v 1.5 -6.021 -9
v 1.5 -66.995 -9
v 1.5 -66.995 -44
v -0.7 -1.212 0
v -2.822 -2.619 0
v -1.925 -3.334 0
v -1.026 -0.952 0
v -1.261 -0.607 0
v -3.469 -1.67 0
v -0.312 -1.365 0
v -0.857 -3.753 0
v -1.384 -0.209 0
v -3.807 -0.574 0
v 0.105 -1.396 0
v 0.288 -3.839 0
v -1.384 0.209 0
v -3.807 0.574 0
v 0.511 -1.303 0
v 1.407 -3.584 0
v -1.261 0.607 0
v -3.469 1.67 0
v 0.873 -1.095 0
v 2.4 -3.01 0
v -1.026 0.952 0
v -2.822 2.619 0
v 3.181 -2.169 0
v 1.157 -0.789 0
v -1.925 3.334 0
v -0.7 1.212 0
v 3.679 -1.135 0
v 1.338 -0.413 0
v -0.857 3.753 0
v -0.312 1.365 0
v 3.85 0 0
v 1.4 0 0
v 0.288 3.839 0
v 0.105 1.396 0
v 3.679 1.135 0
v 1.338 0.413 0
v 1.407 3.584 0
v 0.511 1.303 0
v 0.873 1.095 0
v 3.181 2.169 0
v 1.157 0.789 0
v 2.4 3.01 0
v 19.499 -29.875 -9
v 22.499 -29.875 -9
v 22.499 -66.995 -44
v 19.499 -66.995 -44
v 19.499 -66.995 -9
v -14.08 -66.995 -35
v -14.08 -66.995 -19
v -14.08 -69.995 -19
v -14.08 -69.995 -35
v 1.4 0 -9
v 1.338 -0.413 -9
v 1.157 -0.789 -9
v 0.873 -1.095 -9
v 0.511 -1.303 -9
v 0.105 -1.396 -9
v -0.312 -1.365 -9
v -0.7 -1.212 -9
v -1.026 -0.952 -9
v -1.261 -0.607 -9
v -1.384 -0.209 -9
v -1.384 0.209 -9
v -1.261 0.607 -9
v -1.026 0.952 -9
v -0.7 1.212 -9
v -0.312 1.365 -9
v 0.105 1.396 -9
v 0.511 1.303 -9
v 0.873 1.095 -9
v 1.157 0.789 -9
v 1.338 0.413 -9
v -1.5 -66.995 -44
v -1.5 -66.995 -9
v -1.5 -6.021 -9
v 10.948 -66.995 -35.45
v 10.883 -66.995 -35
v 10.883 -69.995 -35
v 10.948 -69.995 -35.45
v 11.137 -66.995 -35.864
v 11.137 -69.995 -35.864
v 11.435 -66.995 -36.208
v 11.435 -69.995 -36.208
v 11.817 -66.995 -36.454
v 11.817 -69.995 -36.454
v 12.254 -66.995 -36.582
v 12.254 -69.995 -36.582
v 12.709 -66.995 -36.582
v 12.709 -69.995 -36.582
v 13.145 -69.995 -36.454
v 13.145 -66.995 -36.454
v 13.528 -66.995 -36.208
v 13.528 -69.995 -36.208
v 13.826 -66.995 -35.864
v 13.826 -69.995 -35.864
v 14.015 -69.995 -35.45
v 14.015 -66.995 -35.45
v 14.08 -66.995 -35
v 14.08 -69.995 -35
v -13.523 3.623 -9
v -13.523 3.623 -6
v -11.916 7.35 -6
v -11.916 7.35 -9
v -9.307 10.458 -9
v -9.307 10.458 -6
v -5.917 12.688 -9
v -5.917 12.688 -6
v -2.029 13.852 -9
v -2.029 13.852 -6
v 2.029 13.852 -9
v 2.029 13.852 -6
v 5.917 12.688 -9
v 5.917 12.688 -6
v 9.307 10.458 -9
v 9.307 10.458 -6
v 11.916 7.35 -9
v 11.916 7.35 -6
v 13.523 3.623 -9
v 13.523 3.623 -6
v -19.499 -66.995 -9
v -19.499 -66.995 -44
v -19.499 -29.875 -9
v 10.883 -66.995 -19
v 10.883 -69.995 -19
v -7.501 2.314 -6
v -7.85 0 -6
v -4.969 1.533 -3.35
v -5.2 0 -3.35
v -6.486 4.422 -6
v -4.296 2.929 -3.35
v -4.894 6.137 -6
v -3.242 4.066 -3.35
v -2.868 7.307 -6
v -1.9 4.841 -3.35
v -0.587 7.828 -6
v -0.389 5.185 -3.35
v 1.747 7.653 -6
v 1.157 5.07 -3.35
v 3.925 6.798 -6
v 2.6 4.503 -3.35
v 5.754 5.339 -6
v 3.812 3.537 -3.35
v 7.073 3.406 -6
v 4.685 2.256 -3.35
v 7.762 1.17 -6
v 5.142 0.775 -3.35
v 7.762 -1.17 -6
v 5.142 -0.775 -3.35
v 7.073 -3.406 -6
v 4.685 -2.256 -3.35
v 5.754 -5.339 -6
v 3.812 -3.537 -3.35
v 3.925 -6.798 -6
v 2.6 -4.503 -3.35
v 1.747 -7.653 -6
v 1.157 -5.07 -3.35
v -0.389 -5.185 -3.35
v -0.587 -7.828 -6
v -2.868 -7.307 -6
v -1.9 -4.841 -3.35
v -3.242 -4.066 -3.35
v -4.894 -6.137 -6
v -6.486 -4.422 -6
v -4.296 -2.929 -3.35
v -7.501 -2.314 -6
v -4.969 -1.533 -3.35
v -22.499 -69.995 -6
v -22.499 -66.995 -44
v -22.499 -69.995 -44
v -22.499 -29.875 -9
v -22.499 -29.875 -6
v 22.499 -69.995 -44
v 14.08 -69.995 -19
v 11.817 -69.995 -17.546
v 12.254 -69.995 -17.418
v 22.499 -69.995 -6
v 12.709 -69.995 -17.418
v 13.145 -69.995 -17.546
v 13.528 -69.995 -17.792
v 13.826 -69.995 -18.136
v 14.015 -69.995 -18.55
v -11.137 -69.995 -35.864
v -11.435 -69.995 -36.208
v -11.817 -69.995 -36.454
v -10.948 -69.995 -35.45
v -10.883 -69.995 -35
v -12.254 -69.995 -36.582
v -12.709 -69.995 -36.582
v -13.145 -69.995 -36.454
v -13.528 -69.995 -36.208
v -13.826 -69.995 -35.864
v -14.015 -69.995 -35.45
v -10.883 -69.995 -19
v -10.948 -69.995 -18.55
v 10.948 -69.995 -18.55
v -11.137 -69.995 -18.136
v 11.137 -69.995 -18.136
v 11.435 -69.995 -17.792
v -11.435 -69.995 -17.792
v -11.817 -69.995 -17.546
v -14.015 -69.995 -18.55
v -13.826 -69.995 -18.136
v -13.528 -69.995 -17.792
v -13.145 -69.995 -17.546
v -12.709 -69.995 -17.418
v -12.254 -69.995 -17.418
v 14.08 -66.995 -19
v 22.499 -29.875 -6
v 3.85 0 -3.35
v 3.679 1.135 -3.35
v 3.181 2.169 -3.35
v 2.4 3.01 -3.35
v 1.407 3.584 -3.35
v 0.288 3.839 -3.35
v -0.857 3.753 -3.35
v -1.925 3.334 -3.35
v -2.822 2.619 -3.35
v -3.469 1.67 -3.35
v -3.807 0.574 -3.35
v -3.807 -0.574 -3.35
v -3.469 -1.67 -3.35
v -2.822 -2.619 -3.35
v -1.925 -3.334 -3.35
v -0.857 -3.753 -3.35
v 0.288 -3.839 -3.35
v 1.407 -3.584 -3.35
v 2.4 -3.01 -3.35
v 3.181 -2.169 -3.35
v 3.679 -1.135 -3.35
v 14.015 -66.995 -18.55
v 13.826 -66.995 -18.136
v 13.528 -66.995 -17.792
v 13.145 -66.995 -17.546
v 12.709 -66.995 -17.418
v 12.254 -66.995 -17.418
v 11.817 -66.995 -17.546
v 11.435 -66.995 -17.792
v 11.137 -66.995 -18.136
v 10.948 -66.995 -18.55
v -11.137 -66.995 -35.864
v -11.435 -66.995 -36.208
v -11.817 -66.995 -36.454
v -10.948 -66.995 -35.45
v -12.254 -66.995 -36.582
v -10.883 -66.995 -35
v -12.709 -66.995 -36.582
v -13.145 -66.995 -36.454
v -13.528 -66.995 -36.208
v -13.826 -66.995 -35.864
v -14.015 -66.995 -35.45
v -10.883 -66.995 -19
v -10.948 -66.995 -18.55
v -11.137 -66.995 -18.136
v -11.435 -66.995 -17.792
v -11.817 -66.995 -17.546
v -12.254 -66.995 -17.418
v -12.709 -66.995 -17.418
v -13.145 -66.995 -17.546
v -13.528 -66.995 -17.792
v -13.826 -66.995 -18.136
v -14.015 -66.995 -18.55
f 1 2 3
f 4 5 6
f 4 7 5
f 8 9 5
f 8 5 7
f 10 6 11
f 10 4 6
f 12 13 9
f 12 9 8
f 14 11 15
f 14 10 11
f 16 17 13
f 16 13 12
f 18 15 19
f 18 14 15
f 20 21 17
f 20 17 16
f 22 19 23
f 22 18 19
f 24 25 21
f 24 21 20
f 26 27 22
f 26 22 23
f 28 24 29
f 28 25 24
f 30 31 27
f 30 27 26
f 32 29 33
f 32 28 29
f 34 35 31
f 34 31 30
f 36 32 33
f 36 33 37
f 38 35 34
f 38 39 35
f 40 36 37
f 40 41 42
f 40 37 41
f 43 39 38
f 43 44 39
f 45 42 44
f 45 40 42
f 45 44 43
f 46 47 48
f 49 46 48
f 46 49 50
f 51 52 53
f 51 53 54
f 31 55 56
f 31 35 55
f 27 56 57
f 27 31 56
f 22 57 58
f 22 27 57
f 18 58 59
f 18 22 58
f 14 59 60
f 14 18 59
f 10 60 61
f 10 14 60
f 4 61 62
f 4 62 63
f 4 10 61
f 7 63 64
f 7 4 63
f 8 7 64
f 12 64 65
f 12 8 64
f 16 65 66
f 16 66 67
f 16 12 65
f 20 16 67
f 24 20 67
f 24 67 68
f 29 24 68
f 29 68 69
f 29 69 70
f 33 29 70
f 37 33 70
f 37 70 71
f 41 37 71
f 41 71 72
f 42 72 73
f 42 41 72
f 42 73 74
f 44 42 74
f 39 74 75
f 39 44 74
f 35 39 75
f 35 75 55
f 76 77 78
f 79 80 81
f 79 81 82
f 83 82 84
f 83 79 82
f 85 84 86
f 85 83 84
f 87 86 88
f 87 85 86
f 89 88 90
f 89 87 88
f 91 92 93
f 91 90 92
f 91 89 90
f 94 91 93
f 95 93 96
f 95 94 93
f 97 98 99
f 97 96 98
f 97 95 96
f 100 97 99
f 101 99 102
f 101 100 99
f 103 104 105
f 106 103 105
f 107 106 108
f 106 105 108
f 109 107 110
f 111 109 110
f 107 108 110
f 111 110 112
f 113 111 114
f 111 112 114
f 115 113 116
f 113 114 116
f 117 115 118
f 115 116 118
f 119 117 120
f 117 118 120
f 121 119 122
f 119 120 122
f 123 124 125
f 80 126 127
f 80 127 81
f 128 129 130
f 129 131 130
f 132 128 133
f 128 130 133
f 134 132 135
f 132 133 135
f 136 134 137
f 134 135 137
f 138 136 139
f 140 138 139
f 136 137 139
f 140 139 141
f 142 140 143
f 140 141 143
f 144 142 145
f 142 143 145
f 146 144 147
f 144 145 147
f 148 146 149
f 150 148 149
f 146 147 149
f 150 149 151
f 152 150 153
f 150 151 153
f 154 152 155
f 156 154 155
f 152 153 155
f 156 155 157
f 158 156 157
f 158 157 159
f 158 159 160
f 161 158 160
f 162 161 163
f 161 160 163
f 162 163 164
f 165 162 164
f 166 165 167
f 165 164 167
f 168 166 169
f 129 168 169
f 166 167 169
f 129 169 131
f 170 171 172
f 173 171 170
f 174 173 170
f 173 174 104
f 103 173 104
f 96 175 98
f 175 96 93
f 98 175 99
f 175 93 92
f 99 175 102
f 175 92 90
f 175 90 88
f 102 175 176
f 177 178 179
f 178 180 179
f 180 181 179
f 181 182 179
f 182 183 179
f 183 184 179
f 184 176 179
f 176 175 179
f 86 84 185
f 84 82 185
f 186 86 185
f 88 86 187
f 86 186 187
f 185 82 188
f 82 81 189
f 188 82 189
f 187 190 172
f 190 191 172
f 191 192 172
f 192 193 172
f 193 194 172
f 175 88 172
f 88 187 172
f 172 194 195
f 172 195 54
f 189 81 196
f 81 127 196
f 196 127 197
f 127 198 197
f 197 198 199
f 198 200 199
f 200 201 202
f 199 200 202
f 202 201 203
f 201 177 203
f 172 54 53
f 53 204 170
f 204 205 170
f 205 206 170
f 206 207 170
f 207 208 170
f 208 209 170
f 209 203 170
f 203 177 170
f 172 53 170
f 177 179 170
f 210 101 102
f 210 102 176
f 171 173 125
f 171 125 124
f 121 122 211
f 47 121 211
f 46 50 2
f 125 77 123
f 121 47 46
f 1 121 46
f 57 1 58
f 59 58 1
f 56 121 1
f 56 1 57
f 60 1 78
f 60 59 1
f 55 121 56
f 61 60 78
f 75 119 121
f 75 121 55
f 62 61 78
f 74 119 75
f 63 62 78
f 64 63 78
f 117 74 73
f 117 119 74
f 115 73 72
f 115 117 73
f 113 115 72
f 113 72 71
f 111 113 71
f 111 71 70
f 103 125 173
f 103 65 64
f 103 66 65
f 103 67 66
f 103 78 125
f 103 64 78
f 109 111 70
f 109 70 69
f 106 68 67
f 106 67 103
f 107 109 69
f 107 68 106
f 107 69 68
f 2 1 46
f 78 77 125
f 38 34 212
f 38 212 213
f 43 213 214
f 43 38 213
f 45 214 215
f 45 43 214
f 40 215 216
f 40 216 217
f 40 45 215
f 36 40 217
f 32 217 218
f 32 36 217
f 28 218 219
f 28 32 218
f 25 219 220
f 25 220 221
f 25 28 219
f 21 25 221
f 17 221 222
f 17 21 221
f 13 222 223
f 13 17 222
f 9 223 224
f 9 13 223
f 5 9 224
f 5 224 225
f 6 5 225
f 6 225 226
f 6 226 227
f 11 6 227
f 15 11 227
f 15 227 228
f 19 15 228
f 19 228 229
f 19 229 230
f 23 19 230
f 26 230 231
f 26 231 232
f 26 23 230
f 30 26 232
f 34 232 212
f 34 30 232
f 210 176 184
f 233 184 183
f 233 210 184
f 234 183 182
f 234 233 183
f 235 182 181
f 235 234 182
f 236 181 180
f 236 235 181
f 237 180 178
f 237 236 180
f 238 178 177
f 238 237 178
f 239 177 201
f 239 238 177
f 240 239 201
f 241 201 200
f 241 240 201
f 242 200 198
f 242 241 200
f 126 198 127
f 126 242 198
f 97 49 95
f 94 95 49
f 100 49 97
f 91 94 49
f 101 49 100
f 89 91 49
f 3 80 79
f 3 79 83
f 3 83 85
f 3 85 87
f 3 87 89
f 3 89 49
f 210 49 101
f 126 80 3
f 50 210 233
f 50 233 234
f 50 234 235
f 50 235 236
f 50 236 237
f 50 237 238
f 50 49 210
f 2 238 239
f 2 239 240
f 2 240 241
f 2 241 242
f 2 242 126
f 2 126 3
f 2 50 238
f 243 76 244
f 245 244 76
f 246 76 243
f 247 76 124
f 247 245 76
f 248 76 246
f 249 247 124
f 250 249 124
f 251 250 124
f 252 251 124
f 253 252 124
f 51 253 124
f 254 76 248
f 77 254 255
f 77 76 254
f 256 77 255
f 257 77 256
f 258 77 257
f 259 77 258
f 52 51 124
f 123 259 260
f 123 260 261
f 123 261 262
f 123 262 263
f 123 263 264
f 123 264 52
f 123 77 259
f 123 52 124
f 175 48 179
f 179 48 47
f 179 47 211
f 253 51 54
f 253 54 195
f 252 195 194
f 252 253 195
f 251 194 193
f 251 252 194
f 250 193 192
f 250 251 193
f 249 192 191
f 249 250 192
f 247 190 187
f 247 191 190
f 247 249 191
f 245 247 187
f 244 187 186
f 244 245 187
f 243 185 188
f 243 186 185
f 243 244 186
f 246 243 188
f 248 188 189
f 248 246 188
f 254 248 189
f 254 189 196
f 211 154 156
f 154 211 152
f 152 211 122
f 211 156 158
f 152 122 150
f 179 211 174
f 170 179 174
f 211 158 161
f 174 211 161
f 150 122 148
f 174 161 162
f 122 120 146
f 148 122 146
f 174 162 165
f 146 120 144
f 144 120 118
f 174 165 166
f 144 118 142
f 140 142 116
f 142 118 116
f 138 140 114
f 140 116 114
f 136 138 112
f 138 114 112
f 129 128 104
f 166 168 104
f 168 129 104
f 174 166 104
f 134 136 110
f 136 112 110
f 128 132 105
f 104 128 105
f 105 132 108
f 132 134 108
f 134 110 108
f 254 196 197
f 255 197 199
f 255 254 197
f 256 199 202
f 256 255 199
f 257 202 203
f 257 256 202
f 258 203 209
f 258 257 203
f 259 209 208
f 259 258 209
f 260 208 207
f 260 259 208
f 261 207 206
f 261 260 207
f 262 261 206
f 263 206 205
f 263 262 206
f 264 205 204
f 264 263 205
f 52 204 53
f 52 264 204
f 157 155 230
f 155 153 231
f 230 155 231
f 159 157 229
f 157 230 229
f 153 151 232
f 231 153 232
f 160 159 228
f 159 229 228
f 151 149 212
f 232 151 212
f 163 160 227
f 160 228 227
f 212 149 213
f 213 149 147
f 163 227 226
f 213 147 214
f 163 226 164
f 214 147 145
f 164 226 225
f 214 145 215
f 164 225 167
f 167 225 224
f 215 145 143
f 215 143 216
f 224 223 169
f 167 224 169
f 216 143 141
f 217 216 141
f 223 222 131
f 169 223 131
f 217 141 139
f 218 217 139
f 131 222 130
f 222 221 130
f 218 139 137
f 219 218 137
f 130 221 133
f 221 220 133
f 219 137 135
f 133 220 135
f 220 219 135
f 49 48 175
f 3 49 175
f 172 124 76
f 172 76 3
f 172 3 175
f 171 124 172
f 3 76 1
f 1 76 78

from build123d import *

# Parameters (mm, degrees)
SKETCH_1_R           = 3.85
SKETCH_1_R_2         = 1.4
EXTRUDE_1_DEPTH      = 3.35
SKETCH_3_R           = 7.85
SKETCH_2_R           = 5.2
EXTRUDE_2_DEPTH      = 3
CUT_EXTRUDE_START    = -23.35
SKETCH_7_R           = 1.4
CUT_EXTRUDE_1_DEPTH  = 23.35
SKETCH_11_W          = 44.997612104
SKETCH_11_H          = 3
EXTRUDE_3_DEPTH      = 35
CUT_EXTRUDE_4_DEPTH  = 35
EXTRUDE_4_DEPTH      = 3
EXTRUDE_5_DEPTH      = 1.5
EXTRUDE_5_DEPTH_BACK = 1.5


with BuildPart() as part:
    # 草图1 → 凸台-拉伸1 (new body)
    with BuildSketch(Plane.XY):
        Circle(SKETCH_1_R)
        Circle(SKETCH_1_R_2, mode=Mode.SUBTRACT)
    extrude(amount=-EXTRUDE_1_DEPTH)

    # 草图3 → 放样1 section 0
    with BuildSketch(Plane(origin=(0, 0, -6), x_dir=(-1, 0, 0), z_dir=(0, 0, -1))):
        Circle(SKETCH_3_R)
    # 草图2 → 放样1 section 1
    with BuildSketch(Plane(origin=(0, 0, -3.35), x_dir=(-1, 0, 0), z_dir=(0, 0, -1))):
        Circle(SKETCH_2_R)
    loft()

    # 草图6 → 凸台-拉伸2 (add)
    with BuildSketch(Plane(origin=(0, 0, -6), x_dir=(-1, 0, 0), z_dir=(0, 0, -1))):
        with BuildLine():
            Line((-22.498806052, -29.874841024), (-22.498806052, -69.994841024))
            Line((-22.498806052, -69.994841024), (22.498806052, -69.994841024))
            Line((22.498806052, -69.994841024), (22.498806052, -29.874841024))
            Line((22.498806052, -29.874841024), (13.522961568, 3.623466631))
            ThreePointArc((13.522961568, 3.623466631), (0, 14), (-13.522961568, 3.623466631))
            Line((-13.522961568, 3.623466631), (-22.498806052, -29.874841024))
        make_face()
    extrude(amount=EXTRUDE_2_DEPTH)

    # 草图7 → 切除-拉伸1 (cut)
    with BuildSketch(Plane(origin=(0, 0, -9), x_dir=(-1, 0, 0), z_dir=(0, 0, -1)).offset(CUT_EXTRUDE_START)):
        with Locations(Location((0, 0, 0), (0, 0, 180))):
            Circle(SKETCH_7_R)
    extrude(amount=CUT_EXTRUDE_1_DEPTH, mode=Mode.SUBTRACT)

    # 草图11 → 凸台-拉伸3 (add)
    with BuildSketch(Plane(origin=(0, 0, -9), x_dir=(-1, 0, 0), z_dir=(0, 0, -1))):
        with Locations((0, -68.494841024)):
            Rectangle(SKETCH_11_W, SKETCH_11_H)
    extrude(amount=EXTRUDE_3_DEPTH)

    # 草图14 → 切除-拉伸4 (cut)
    with BuildSketch(Plane(origin=(0, -66.994841024, 0), x_dir=(1, 0, 0), z_dir=(0, 1, 0))):
        with BuildLine():
            Line((14.079686052, 35), (14.079686052, 19))
            ThreePointArc((14.079686052, 19), (12.481386052, 17.4017), (10.883086052, 19))
            Line((10.883086052, 19), (10.883086052, 35))
            ThreePointArc((10.883086052, 35), (12.481386052, 36.5983), (14.079686052, 35))
        make_face()
        with BuildLine():
            ThreePointArc((-10.883086052, 19), (-12.481386052, 17.4017), (-14.079686052, 19))
            Line((-14.079686052, 19), (-14.079686052, 35))
            ThreePointArc((-14.079686052, 35), (-12.481386052, 36.5983), (-10.883086052, 35))
            Line((-10.883086052, 35), (-10.883086052, 19))
        make_face()
    extrude(amount=-CUT_EXTRUDE_4_DEPTH, mode=Mode.SUBTRACT)

    # 草图15 → 凸台-拉伸4 (add)
    with BuildSketch(Plane(origin=(22.498806052, 0, 0), x_dir=(0, 0, -1), z_dir=(1, 0, 0))):
        Polygon((9, -29.874841024), (44, -66.994841024), (44, -69.994841024), (6, -69.994841024), (6, -29.874841024), align=None)
    extrude_4 = extrude(amount=-EXTRUDE_4_DEPTH)

    # 镜向1: 凸台-拉伸4 across plane
    add(extrude_4.mirror(Plane(origin=(0, 0, 0), x_dir=(0, 0, 1), z_dir=(1, 0, 0))))

    # 草图19 → 凸台-拉伸5 (add, two sides: drawn at the far end of the back side and taken through both)
    with BuildSketch(Plane(origin=(0, 0, 0), x_dir=(0, 0, -1), z_dir=(1, 0, 0)).offset(-EXTRUDE_5_DEPTH_BACK)):
        Polygon((44, -66.994841024), (9, -6.021479283), (9, -66.994841024), align=None)
    extrude(amount=EXTRUDE_5_DEPTH + EXTRUDE_5_DEPTH_BACK)


solid = part.part
